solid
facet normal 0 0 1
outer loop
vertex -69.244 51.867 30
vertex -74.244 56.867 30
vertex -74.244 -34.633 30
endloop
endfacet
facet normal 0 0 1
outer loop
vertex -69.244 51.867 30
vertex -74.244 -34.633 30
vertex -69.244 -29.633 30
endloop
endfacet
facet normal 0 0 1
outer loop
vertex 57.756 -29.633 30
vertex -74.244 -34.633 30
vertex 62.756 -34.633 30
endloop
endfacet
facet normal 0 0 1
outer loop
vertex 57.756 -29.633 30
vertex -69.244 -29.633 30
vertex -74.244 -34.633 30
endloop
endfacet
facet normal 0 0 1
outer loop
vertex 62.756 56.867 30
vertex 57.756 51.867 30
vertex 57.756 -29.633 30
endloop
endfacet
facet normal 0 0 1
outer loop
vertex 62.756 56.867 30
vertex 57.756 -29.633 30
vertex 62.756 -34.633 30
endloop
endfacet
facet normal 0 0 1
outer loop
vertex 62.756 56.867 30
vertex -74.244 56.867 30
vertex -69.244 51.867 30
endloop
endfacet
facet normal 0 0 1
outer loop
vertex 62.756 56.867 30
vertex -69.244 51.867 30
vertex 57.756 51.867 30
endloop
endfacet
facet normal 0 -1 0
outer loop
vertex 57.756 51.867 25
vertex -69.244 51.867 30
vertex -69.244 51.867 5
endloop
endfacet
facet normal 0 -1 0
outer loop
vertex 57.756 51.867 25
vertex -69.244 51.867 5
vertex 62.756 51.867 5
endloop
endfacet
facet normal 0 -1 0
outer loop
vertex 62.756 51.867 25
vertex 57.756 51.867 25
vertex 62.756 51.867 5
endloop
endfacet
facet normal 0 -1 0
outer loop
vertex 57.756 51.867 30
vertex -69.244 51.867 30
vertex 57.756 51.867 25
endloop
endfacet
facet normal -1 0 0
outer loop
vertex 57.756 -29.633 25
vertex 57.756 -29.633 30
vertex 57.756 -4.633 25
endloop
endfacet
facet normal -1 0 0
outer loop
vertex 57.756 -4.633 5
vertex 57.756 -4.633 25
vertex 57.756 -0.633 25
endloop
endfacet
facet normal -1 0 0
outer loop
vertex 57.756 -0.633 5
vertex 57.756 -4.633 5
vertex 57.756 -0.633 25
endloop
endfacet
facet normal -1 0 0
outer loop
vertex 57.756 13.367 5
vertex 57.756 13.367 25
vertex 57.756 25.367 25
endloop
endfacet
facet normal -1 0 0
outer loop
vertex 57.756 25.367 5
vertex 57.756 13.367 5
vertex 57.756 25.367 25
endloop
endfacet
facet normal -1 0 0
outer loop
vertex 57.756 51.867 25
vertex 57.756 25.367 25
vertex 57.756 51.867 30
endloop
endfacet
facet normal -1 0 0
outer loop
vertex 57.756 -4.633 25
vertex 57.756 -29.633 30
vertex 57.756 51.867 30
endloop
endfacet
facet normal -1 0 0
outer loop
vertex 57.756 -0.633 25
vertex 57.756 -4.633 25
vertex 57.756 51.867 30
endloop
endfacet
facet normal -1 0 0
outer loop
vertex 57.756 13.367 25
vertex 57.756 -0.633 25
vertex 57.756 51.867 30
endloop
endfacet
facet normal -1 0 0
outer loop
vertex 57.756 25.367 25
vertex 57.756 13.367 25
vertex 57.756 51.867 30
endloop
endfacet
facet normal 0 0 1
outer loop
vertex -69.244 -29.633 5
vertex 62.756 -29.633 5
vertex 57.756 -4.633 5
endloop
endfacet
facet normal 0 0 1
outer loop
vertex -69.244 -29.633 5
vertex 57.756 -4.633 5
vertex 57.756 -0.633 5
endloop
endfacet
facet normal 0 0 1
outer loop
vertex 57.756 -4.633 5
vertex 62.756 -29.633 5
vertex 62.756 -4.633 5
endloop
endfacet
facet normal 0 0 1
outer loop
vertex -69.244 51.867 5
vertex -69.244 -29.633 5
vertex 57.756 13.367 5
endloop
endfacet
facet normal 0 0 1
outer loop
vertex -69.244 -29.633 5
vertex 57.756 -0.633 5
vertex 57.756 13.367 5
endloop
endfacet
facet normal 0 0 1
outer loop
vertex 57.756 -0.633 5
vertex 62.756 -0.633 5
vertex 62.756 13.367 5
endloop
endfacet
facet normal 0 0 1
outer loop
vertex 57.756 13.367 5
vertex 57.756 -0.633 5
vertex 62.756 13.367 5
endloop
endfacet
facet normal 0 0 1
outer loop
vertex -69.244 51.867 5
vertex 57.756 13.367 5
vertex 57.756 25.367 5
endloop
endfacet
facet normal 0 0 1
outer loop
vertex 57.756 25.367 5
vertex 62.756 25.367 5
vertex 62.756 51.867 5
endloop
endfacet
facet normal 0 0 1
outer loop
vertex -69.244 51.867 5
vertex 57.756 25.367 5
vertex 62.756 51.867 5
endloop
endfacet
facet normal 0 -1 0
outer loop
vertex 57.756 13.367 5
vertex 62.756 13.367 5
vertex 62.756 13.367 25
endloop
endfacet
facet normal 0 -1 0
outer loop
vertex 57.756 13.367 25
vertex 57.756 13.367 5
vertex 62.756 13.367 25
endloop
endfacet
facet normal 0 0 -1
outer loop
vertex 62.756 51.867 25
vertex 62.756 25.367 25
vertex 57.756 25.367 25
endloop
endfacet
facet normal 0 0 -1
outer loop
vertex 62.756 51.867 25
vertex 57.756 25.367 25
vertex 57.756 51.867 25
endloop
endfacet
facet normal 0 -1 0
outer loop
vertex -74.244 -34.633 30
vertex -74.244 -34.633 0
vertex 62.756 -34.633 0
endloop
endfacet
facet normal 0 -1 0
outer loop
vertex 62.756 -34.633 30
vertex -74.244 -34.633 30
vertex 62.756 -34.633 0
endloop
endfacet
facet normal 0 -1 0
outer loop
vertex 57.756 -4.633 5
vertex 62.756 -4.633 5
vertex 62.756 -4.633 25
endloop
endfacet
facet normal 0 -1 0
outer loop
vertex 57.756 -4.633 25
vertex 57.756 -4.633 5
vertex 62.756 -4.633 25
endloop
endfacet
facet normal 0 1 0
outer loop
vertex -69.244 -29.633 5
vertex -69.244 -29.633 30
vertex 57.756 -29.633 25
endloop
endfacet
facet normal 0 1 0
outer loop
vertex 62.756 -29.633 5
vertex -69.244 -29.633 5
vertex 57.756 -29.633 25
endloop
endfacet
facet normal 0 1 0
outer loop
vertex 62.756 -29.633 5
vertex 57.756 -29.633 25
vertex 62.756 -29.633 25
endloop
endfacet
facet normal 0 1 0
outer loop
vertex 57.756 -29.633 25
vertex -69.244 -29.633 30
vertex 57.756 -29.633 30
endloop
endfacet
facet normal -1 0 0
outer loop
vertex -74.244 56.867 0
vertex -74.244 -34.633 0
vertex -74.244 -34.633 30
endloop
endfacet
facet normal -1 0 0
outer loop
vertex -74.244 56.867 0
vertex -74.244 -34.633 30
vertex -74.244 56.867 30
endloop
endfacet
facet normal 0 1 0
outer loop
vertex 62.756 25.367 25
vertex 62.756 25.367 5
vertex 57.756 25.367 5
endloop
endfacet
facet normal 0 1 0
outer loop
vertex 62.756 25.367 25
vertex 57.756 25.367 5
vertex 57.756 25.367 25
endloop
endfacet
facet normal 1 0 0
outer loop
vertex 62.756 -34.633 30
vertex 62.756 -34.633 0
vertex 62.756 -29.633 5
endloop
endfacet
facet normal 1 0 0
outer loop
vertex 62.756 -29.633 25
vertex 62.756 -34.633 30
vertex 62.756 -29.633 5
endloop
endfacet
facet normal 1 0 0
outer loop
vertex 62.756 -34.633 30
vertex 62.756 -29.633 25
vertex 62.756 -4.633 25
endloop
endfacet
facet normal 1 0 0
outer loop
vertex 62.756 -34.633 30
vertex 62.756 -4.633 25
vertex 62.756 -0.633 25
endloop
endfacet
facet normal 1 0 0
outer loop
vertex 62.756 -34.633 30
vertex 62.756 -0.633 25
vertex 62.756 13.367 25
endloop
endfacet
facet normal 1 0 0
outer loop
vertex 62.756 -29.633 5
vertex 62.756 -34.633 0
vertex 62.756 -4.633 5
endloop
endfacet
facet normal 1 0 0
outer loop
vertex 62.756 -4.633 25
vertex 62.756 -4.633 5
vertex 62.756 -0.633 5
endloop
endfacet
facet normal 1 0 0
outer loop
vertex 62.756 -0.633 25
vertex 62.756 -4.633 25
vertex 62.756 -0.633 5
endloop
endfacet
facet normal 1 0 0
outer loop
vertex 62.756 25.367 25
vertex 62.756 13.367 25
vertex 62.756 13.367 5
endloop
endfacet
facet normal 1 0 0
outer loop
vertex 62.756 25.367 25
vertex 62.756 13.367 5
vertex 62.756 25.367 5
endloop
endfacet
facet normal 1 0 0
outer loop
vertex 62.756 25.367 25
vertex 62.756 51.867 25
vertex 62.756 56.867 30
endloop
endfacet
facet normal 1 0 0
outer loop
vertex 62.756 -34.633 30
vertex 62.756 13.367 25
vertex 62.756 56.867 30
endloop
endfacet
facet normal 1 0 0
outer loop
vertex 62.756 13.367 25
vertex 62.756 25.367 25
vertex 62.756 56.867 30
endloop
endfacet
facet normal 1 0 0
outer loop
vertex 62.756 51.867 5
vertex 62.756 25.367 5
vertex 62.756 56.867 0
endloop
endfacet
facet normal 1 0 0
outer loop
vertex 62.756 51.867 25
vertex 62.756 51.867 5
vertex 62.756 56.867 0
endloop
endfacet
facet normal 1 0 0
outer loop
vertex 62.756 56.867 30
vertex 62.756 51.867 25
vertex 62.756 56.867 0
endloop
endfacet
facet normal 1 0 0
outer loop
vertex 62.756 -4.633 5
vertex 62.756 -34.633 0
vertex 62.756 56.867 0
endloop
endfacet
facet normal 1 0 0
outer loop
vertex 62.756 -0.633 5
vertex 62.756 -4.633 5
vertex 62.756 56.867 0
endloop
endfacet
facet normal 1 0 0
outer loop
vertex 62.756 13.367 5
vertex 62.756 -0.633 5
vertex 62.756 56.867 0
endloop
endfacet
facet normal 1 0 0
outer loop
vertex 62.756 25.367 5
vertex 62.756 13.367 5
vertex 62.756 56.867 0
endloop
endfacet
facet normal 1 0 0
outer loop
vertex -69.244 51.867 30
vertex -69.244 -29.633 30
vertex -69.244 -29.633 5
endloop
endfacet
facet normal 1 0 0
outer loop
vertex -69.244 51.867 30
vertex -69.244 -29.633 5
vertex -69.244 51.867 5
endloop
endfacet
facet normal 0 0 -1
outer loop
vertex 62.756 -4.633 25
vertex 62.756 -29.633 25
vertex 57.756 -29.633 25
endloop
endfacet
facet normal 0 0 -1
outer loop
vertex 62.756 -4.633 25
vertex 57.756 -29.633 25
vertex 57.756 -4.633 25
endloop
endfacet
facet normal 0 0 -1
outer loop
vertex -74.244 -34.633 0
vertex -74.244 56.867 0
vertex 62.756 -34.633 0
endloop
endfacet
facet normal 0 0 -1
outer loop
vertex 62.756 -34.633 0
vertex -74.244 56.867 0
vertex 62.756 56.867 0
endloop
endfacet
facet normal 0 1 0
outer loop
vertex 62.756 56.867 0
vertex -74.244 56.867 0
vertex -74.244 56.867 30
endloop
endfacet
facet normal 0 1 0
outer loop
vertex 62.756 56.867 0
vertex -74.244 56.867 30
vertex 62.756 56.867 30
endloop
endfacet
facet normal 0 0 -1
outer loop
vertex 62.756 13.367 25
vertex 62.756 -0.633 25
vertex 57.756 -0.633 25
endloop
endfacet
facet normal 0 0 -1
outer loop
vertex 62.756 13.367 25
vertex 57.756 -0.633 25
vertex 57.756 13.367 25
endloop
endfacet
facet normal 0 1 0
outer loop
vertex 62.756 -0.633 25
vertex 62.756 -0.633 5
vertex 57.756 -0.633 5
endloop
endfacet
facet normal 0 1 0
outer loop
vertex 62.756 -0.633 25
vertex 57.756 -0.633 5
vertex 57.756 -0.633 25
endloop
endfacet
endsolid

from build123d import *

# Parameters (mm, degrees)
F0_W     = 137
F0_H     = 91.5
F1_DEPTH = 30
F2_W     = 127
F2_H     = 81.5
F3_DEPTH = 25
F4_W     = 25
F4_H     = 20
F4_W_2   = 14
F4_W_3   = 26.5
F5_DEPTH = 5


with BuildPart() as f1:
    # F0 (on Top) → F1 (new body)
    with BuildSketch(Plane.XY):
        with Locations((-5.744236, 11.116833)):
            Rectangle(F0_W, F0_H)
    extrude(amount=F1_DEPTH)

    # F2 (on face) → F3 (cut)
    with BuildSketch(Plane.XY.offset(30)):
        with Locations((-5.744236, 11.116833)):
            Rectangle(F2_W, F2_H)
    extrude(amount=-F3_DEPTH, mode=Mode.SUBTRACT)

    # F4 (on face) → F5 (cut)
    with BuildSketch(Plane.YZ.offset(62.755764)):
        with Locations((-17.133167, 15)):
            Rectangle(F4_W, F4_H)
        with Locations((6.366833, 15)):
            Rectangle(F4_W_2, F4_H)
        with Locations((38.616833, 15)):
            Rectangle(F4_W_3, F4_H)
    extrude(amount=-F5_DEPTH, mode=Mode.SUBTRACT)


solid = f1.part
